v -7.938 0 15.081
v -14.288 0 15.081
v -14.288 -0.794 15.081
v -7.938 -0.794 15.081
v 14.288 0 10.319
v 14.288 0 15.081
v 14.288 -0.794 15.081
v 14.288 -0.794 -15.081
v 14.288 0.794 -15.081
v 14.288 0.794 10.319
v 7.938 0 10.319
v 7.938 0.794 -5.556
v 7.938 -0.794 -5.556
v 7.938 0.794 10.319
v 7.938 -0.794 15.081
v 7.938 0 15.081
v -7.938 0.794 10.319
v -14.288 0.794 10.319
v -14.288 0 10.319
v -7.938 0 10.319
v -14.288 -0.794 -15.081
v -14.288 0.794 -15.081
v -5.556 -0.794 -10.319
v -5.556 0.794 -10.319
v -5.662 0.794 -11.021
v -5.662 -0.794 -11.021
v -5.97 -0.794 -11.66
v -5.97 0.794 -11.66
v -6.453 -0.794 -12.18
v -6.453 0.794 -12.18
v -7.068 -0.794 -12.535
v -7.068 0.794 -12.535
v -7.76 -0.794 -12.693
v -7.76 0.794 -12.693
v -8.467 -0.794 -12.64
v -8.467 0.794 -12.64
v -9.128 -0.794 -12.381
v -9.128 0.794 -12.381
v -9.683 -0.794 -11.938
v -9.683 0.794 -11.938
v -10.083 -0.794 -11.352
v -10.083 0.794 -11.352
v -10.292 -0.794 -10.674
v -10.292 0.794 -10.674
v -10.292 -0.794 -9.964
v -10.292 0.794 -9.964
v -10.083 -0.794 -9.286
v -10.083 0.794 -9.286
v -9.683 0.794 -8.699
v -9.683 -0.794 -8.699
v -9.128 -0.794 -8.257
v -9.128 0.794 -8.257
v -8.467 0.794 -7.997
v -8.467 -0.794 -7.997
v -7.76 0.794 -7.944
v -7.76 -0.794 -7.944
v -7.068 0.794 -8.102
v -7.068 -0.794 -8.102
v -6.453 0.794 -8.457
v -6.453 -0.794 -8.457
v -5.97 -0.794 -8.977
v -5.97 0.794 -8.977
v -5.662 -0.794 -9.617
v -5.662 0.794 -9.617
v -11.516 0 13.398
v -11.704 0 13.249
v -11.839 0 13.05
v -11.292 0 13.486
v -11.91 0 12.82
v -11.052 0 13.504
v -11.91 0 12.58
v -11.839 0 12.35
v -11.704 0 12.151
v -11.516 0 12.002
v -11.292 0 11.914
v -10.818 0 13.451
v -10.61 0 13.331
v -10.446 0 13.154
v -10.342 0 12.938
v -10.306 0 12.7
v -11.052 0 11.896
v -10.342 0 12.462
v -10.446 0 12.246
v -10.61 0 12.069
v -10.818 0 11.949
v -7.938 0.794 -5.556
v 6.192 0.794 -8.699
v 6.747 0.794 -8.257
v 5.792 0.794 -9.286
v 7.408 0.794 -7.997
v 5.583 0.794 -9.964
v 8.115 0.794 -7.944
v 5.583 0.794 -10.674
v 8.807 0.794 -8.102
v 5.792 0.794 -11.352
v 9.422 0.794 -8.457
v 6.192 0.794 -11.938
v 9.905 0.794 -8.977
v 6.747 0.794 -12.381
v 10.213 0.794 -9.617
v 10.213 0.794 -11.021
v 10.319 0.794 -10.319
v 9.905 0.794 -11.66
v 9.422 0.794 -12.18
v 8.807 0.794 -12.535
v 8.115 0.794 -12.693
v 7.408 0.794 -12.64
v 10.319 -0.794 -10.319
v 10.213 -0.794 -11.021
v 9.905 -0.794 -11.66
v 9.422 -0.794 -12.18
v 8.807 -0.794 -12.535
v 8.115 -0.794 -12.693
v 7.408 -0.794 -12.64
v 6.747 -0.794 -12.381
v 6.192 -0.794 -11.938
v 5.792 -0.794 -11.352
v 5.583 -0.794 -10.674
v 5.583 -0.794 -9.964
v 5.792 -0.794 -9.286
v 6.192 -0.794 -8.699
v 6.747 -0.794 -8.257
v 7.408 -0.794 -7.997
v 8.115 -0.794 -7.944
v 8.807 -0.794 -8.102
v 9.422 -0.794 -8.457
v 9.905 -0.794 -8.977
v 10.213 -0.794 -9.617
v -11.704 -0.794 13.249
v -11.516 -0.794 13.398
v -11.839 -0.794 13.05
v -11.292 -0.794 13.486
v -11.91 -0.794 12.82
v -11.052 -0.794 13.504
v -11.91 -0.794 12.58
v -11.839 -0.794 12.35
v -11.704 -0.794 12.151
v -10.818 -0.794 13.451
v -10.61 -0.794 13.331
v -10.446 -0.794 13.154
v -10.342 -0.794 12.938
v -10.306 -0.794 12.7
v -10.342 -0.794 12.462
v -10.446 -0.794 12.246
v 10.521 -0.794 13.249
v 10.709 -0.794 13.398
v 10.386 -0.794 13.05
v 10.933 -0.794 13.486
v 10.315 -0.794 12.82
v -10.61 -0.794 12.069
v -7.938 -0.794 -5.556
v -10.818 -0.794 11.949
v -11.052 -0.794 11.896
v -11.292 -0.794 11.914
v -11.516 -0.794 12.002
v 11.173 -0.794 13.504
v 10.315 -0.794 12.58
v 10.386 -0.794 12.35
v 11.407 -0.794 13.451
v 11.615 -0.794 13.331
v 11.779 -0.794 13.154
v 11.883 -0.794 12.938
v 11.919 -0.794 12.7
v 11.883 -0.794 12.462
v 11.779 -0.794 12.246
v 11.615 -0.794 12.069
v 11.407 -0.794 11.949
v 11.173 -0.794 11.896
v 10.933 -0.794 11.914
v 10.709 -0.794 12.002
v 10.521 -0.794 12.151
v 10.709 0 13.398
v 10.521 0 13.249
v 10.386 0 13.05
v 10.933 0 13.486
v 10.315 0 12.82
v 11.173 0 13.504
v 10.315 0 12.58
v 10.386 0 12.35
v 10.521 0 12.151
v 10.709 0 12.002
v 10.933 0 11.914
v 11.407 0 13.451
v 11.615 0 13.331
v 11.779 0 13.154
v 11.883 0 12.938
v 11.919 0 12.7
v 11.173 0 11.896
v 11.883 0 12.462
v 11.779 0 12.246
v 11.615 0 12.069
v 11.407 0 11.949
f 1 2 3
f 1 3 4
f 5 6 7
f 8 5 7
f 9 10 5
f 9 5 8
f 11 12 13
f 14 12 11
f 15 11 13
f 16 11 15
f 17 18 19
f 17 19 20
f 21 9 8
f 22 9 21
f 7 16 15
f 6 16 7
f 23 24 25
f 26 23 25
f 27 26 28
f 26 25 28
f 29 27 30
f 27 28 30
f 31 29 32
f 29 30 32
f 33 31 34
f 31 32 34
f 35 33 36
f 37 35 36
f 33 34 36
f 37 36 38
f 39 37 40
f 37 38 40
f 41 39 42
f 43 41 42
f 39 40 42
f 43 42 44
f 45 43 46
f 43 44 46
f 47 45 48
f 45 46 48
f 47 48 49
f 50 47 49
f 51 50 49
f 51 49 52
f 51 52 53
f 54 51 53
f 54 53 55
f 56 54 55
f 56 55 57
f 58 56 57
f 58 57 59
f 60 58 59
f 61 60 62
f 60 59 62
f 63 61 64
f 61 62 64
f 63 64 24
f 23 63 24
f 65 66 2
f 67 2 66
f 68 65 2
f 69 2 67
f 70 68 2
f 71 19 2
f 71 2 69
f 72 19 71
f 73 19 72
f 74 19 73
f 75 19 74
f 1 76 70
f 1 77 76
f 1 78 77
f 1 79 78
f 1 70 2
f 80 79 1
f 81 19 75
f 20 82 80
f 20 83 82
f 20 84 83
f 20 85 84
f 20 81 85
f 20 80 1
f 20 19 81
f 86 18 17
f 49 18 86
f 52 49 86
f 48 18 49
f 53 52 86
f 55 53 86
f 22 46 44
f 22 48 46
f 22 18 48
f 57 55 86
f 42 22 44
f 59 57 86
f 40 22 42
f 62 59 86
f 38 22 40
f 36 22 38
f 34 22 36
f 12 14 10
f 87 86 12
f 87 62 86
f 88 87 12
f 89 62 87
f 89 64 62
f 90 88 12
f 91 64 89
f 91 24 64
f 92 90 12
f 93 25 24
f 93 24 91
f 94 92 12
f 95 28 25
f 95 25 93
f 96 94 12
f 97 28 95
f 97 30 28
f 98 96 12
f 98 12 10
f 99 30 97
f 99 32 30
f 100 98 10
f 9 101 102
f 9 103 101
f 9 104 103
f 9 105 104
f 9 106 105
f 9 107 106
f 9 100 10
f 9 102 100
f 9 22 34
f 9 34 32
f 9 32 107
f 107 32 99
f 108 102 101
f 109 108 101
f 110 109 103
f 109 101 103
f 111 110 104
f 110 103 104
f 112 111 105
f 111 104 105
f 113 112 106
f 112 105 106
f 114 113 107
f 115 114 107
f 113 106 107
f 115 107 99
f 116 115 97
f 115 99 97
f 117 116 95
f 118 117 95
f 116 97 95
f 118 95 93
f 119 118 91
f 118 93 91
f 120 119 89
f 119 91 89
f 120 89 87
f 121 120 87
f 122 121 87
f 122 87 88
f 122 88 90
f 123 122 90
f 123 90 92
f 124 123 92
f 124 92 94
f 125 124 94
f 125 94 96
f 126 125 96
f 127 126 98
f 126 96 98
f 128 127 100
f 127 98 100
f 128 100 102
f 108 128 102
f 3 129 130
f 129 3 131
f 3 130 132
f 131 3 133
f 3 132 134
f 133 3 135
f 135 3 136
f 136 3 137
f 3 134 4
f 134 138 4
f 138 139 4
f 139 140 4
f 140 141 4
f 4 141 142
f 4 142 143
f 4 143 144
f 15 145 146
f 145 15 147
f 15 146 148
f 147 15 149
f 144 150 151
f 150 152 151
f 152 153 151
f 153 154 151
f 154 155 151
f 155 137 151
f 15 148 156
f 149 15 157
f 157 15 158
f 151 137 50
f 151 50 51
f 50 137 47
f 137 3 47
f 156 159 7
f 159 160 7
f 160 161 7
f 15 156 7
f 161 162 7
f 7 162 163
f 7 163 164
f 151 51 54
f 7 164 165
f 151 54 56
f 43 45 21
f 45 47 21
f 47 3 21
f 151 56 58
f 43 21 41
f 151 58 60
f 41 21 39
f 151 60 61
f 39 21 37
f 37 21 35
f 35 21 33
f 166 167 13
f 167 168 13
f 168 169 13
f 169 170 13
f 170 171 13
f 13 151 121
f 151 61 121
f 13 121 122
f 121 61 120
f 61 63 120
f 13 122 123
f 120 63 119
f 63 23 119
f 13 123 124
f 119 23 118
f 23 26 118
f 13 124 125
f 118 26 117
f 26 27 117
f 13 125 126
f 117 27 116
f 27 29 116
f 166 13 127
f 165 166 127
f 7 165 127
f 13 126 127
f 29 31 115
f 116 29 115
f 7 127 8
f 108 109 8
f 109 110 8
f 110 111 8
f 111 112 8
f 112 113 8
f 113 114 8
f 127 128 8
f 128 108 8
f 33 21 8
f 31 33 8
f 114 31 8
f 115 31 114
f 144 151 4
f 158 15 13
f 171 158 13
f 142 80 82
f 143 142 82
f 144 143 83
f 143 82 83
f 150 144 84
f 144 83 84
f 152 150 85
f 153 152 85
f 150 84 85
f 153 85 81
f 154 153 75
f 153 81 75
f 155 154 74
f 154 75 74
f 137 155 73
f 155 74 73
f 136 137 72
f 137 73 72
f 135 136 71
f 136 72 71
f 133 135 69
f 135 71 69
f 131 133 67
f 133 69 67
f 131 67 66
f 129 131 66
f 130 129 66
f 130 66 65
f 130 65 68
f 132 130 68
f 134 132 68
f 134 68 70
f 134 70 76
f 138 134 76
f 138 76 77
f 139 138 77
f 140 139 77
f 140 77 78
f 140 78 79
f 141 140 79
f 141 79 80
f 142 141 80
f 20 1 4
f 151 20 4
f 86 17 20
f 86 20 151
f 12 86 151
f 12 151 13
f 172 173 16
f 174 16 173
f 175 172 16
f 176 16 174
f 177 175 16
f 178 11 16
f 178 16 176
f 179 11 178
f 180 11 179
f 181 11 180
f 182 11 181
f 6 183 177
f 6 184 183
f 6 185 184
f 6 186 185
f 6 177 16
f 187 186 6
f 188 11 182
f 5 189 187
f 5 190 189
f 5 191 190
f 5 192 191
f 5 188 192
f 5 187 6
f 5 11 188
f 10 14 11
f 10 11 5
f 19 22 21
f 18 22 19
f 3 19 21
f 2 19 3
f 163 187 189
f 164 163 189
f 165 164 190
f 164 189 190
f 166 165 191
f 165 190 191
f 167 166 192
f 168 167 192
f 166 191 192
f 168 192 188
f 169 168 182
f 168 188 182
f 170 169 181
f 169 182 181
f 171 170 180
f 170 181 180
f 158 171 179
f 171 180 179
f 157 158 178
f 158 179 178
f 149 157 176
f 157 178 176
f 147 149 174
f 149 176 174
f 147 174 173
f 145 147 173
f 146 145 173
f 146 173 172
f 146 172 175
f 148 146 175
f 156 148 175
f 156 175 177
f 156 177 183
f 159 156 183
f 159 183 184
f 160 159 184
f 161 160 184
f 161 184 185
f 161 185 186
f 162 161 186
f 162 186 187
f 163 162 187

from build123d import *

# Parameters (mm, degrees)
BOSS_EXTRUDE1_DEPTH = 0.79375
SKETCH2_W           = 6.35
SKETCH2_H           = 4.7625
CUT_EXTRUDE1_DEPTH  = 0.79375
SKETCH3_R           = 0.80645
SKETCH3_R_2         = 2.38125
CUT_EXTRUDE2_DEPTH  = 1.5875


with BuildPart() as part:
    # Sketch1 → Boss-Extrude1 (new body, symmetric)
    with BuildSketch(Plane(origin=(0, 0, 0), x_dir=(1, 0, 0), z_dir=(0, 1, 0))):
        Polygon((14.2875, 15.08125), (-14.2875, 15.08125), (-14.2875, -15.08125), (-7.9375, -15.08125), (-7.9375, 5.55625), (7.9375, 5.55625), (7.9375, -15.08125), (14.2875, -15.08125), align=None)
    extrude(amount=BOSS_EXTRUDE1_DEPTH, both=True)

    # Sketch2 → Cut-Extrude1 (cut)
    with BuildSketch(Plane(origin=(0, 0.79375, 0), x_dir=(1, 0, 0), z_dir=(0, 1, 0))):
        with Locations((-11.1125, -12.7)):
            Rectangle(SKETCH2_W, SKETCH2_H)
        with Locations((11.1125, -12.7)):
            Rectangle(SKETCH2_W, SKETCH2_H)
    extrude(amount=-CUT_EXTRUDE1_DEPTH, mode=Mode.SUBTRACT)

    # Sketch3 → Cut-Extrude2 (cut)
    with BuildSketch(Plane(origin=(0, 0.79375, 0), x_dir=(1, 0, 0), z_dir=(0, 1, 0))):
        with Locations((-11.1125, -12.7)):
            Circle(SKETCH3_R)
        with Locations((-7.9375, 10.31875)):
            Circle(SKETCH3_R_2)
        with Locations((11.1125, -12.7)):
            Circle(SKETCH3_R)
        with Locations((7.9375, 10.31875)):
            Circle(SKETCH3_R_2)
    extrude(amount=-CUT_EXTRUDE2_DEPTH, mode=Mode.SUBTRACT)


solid = part.part
